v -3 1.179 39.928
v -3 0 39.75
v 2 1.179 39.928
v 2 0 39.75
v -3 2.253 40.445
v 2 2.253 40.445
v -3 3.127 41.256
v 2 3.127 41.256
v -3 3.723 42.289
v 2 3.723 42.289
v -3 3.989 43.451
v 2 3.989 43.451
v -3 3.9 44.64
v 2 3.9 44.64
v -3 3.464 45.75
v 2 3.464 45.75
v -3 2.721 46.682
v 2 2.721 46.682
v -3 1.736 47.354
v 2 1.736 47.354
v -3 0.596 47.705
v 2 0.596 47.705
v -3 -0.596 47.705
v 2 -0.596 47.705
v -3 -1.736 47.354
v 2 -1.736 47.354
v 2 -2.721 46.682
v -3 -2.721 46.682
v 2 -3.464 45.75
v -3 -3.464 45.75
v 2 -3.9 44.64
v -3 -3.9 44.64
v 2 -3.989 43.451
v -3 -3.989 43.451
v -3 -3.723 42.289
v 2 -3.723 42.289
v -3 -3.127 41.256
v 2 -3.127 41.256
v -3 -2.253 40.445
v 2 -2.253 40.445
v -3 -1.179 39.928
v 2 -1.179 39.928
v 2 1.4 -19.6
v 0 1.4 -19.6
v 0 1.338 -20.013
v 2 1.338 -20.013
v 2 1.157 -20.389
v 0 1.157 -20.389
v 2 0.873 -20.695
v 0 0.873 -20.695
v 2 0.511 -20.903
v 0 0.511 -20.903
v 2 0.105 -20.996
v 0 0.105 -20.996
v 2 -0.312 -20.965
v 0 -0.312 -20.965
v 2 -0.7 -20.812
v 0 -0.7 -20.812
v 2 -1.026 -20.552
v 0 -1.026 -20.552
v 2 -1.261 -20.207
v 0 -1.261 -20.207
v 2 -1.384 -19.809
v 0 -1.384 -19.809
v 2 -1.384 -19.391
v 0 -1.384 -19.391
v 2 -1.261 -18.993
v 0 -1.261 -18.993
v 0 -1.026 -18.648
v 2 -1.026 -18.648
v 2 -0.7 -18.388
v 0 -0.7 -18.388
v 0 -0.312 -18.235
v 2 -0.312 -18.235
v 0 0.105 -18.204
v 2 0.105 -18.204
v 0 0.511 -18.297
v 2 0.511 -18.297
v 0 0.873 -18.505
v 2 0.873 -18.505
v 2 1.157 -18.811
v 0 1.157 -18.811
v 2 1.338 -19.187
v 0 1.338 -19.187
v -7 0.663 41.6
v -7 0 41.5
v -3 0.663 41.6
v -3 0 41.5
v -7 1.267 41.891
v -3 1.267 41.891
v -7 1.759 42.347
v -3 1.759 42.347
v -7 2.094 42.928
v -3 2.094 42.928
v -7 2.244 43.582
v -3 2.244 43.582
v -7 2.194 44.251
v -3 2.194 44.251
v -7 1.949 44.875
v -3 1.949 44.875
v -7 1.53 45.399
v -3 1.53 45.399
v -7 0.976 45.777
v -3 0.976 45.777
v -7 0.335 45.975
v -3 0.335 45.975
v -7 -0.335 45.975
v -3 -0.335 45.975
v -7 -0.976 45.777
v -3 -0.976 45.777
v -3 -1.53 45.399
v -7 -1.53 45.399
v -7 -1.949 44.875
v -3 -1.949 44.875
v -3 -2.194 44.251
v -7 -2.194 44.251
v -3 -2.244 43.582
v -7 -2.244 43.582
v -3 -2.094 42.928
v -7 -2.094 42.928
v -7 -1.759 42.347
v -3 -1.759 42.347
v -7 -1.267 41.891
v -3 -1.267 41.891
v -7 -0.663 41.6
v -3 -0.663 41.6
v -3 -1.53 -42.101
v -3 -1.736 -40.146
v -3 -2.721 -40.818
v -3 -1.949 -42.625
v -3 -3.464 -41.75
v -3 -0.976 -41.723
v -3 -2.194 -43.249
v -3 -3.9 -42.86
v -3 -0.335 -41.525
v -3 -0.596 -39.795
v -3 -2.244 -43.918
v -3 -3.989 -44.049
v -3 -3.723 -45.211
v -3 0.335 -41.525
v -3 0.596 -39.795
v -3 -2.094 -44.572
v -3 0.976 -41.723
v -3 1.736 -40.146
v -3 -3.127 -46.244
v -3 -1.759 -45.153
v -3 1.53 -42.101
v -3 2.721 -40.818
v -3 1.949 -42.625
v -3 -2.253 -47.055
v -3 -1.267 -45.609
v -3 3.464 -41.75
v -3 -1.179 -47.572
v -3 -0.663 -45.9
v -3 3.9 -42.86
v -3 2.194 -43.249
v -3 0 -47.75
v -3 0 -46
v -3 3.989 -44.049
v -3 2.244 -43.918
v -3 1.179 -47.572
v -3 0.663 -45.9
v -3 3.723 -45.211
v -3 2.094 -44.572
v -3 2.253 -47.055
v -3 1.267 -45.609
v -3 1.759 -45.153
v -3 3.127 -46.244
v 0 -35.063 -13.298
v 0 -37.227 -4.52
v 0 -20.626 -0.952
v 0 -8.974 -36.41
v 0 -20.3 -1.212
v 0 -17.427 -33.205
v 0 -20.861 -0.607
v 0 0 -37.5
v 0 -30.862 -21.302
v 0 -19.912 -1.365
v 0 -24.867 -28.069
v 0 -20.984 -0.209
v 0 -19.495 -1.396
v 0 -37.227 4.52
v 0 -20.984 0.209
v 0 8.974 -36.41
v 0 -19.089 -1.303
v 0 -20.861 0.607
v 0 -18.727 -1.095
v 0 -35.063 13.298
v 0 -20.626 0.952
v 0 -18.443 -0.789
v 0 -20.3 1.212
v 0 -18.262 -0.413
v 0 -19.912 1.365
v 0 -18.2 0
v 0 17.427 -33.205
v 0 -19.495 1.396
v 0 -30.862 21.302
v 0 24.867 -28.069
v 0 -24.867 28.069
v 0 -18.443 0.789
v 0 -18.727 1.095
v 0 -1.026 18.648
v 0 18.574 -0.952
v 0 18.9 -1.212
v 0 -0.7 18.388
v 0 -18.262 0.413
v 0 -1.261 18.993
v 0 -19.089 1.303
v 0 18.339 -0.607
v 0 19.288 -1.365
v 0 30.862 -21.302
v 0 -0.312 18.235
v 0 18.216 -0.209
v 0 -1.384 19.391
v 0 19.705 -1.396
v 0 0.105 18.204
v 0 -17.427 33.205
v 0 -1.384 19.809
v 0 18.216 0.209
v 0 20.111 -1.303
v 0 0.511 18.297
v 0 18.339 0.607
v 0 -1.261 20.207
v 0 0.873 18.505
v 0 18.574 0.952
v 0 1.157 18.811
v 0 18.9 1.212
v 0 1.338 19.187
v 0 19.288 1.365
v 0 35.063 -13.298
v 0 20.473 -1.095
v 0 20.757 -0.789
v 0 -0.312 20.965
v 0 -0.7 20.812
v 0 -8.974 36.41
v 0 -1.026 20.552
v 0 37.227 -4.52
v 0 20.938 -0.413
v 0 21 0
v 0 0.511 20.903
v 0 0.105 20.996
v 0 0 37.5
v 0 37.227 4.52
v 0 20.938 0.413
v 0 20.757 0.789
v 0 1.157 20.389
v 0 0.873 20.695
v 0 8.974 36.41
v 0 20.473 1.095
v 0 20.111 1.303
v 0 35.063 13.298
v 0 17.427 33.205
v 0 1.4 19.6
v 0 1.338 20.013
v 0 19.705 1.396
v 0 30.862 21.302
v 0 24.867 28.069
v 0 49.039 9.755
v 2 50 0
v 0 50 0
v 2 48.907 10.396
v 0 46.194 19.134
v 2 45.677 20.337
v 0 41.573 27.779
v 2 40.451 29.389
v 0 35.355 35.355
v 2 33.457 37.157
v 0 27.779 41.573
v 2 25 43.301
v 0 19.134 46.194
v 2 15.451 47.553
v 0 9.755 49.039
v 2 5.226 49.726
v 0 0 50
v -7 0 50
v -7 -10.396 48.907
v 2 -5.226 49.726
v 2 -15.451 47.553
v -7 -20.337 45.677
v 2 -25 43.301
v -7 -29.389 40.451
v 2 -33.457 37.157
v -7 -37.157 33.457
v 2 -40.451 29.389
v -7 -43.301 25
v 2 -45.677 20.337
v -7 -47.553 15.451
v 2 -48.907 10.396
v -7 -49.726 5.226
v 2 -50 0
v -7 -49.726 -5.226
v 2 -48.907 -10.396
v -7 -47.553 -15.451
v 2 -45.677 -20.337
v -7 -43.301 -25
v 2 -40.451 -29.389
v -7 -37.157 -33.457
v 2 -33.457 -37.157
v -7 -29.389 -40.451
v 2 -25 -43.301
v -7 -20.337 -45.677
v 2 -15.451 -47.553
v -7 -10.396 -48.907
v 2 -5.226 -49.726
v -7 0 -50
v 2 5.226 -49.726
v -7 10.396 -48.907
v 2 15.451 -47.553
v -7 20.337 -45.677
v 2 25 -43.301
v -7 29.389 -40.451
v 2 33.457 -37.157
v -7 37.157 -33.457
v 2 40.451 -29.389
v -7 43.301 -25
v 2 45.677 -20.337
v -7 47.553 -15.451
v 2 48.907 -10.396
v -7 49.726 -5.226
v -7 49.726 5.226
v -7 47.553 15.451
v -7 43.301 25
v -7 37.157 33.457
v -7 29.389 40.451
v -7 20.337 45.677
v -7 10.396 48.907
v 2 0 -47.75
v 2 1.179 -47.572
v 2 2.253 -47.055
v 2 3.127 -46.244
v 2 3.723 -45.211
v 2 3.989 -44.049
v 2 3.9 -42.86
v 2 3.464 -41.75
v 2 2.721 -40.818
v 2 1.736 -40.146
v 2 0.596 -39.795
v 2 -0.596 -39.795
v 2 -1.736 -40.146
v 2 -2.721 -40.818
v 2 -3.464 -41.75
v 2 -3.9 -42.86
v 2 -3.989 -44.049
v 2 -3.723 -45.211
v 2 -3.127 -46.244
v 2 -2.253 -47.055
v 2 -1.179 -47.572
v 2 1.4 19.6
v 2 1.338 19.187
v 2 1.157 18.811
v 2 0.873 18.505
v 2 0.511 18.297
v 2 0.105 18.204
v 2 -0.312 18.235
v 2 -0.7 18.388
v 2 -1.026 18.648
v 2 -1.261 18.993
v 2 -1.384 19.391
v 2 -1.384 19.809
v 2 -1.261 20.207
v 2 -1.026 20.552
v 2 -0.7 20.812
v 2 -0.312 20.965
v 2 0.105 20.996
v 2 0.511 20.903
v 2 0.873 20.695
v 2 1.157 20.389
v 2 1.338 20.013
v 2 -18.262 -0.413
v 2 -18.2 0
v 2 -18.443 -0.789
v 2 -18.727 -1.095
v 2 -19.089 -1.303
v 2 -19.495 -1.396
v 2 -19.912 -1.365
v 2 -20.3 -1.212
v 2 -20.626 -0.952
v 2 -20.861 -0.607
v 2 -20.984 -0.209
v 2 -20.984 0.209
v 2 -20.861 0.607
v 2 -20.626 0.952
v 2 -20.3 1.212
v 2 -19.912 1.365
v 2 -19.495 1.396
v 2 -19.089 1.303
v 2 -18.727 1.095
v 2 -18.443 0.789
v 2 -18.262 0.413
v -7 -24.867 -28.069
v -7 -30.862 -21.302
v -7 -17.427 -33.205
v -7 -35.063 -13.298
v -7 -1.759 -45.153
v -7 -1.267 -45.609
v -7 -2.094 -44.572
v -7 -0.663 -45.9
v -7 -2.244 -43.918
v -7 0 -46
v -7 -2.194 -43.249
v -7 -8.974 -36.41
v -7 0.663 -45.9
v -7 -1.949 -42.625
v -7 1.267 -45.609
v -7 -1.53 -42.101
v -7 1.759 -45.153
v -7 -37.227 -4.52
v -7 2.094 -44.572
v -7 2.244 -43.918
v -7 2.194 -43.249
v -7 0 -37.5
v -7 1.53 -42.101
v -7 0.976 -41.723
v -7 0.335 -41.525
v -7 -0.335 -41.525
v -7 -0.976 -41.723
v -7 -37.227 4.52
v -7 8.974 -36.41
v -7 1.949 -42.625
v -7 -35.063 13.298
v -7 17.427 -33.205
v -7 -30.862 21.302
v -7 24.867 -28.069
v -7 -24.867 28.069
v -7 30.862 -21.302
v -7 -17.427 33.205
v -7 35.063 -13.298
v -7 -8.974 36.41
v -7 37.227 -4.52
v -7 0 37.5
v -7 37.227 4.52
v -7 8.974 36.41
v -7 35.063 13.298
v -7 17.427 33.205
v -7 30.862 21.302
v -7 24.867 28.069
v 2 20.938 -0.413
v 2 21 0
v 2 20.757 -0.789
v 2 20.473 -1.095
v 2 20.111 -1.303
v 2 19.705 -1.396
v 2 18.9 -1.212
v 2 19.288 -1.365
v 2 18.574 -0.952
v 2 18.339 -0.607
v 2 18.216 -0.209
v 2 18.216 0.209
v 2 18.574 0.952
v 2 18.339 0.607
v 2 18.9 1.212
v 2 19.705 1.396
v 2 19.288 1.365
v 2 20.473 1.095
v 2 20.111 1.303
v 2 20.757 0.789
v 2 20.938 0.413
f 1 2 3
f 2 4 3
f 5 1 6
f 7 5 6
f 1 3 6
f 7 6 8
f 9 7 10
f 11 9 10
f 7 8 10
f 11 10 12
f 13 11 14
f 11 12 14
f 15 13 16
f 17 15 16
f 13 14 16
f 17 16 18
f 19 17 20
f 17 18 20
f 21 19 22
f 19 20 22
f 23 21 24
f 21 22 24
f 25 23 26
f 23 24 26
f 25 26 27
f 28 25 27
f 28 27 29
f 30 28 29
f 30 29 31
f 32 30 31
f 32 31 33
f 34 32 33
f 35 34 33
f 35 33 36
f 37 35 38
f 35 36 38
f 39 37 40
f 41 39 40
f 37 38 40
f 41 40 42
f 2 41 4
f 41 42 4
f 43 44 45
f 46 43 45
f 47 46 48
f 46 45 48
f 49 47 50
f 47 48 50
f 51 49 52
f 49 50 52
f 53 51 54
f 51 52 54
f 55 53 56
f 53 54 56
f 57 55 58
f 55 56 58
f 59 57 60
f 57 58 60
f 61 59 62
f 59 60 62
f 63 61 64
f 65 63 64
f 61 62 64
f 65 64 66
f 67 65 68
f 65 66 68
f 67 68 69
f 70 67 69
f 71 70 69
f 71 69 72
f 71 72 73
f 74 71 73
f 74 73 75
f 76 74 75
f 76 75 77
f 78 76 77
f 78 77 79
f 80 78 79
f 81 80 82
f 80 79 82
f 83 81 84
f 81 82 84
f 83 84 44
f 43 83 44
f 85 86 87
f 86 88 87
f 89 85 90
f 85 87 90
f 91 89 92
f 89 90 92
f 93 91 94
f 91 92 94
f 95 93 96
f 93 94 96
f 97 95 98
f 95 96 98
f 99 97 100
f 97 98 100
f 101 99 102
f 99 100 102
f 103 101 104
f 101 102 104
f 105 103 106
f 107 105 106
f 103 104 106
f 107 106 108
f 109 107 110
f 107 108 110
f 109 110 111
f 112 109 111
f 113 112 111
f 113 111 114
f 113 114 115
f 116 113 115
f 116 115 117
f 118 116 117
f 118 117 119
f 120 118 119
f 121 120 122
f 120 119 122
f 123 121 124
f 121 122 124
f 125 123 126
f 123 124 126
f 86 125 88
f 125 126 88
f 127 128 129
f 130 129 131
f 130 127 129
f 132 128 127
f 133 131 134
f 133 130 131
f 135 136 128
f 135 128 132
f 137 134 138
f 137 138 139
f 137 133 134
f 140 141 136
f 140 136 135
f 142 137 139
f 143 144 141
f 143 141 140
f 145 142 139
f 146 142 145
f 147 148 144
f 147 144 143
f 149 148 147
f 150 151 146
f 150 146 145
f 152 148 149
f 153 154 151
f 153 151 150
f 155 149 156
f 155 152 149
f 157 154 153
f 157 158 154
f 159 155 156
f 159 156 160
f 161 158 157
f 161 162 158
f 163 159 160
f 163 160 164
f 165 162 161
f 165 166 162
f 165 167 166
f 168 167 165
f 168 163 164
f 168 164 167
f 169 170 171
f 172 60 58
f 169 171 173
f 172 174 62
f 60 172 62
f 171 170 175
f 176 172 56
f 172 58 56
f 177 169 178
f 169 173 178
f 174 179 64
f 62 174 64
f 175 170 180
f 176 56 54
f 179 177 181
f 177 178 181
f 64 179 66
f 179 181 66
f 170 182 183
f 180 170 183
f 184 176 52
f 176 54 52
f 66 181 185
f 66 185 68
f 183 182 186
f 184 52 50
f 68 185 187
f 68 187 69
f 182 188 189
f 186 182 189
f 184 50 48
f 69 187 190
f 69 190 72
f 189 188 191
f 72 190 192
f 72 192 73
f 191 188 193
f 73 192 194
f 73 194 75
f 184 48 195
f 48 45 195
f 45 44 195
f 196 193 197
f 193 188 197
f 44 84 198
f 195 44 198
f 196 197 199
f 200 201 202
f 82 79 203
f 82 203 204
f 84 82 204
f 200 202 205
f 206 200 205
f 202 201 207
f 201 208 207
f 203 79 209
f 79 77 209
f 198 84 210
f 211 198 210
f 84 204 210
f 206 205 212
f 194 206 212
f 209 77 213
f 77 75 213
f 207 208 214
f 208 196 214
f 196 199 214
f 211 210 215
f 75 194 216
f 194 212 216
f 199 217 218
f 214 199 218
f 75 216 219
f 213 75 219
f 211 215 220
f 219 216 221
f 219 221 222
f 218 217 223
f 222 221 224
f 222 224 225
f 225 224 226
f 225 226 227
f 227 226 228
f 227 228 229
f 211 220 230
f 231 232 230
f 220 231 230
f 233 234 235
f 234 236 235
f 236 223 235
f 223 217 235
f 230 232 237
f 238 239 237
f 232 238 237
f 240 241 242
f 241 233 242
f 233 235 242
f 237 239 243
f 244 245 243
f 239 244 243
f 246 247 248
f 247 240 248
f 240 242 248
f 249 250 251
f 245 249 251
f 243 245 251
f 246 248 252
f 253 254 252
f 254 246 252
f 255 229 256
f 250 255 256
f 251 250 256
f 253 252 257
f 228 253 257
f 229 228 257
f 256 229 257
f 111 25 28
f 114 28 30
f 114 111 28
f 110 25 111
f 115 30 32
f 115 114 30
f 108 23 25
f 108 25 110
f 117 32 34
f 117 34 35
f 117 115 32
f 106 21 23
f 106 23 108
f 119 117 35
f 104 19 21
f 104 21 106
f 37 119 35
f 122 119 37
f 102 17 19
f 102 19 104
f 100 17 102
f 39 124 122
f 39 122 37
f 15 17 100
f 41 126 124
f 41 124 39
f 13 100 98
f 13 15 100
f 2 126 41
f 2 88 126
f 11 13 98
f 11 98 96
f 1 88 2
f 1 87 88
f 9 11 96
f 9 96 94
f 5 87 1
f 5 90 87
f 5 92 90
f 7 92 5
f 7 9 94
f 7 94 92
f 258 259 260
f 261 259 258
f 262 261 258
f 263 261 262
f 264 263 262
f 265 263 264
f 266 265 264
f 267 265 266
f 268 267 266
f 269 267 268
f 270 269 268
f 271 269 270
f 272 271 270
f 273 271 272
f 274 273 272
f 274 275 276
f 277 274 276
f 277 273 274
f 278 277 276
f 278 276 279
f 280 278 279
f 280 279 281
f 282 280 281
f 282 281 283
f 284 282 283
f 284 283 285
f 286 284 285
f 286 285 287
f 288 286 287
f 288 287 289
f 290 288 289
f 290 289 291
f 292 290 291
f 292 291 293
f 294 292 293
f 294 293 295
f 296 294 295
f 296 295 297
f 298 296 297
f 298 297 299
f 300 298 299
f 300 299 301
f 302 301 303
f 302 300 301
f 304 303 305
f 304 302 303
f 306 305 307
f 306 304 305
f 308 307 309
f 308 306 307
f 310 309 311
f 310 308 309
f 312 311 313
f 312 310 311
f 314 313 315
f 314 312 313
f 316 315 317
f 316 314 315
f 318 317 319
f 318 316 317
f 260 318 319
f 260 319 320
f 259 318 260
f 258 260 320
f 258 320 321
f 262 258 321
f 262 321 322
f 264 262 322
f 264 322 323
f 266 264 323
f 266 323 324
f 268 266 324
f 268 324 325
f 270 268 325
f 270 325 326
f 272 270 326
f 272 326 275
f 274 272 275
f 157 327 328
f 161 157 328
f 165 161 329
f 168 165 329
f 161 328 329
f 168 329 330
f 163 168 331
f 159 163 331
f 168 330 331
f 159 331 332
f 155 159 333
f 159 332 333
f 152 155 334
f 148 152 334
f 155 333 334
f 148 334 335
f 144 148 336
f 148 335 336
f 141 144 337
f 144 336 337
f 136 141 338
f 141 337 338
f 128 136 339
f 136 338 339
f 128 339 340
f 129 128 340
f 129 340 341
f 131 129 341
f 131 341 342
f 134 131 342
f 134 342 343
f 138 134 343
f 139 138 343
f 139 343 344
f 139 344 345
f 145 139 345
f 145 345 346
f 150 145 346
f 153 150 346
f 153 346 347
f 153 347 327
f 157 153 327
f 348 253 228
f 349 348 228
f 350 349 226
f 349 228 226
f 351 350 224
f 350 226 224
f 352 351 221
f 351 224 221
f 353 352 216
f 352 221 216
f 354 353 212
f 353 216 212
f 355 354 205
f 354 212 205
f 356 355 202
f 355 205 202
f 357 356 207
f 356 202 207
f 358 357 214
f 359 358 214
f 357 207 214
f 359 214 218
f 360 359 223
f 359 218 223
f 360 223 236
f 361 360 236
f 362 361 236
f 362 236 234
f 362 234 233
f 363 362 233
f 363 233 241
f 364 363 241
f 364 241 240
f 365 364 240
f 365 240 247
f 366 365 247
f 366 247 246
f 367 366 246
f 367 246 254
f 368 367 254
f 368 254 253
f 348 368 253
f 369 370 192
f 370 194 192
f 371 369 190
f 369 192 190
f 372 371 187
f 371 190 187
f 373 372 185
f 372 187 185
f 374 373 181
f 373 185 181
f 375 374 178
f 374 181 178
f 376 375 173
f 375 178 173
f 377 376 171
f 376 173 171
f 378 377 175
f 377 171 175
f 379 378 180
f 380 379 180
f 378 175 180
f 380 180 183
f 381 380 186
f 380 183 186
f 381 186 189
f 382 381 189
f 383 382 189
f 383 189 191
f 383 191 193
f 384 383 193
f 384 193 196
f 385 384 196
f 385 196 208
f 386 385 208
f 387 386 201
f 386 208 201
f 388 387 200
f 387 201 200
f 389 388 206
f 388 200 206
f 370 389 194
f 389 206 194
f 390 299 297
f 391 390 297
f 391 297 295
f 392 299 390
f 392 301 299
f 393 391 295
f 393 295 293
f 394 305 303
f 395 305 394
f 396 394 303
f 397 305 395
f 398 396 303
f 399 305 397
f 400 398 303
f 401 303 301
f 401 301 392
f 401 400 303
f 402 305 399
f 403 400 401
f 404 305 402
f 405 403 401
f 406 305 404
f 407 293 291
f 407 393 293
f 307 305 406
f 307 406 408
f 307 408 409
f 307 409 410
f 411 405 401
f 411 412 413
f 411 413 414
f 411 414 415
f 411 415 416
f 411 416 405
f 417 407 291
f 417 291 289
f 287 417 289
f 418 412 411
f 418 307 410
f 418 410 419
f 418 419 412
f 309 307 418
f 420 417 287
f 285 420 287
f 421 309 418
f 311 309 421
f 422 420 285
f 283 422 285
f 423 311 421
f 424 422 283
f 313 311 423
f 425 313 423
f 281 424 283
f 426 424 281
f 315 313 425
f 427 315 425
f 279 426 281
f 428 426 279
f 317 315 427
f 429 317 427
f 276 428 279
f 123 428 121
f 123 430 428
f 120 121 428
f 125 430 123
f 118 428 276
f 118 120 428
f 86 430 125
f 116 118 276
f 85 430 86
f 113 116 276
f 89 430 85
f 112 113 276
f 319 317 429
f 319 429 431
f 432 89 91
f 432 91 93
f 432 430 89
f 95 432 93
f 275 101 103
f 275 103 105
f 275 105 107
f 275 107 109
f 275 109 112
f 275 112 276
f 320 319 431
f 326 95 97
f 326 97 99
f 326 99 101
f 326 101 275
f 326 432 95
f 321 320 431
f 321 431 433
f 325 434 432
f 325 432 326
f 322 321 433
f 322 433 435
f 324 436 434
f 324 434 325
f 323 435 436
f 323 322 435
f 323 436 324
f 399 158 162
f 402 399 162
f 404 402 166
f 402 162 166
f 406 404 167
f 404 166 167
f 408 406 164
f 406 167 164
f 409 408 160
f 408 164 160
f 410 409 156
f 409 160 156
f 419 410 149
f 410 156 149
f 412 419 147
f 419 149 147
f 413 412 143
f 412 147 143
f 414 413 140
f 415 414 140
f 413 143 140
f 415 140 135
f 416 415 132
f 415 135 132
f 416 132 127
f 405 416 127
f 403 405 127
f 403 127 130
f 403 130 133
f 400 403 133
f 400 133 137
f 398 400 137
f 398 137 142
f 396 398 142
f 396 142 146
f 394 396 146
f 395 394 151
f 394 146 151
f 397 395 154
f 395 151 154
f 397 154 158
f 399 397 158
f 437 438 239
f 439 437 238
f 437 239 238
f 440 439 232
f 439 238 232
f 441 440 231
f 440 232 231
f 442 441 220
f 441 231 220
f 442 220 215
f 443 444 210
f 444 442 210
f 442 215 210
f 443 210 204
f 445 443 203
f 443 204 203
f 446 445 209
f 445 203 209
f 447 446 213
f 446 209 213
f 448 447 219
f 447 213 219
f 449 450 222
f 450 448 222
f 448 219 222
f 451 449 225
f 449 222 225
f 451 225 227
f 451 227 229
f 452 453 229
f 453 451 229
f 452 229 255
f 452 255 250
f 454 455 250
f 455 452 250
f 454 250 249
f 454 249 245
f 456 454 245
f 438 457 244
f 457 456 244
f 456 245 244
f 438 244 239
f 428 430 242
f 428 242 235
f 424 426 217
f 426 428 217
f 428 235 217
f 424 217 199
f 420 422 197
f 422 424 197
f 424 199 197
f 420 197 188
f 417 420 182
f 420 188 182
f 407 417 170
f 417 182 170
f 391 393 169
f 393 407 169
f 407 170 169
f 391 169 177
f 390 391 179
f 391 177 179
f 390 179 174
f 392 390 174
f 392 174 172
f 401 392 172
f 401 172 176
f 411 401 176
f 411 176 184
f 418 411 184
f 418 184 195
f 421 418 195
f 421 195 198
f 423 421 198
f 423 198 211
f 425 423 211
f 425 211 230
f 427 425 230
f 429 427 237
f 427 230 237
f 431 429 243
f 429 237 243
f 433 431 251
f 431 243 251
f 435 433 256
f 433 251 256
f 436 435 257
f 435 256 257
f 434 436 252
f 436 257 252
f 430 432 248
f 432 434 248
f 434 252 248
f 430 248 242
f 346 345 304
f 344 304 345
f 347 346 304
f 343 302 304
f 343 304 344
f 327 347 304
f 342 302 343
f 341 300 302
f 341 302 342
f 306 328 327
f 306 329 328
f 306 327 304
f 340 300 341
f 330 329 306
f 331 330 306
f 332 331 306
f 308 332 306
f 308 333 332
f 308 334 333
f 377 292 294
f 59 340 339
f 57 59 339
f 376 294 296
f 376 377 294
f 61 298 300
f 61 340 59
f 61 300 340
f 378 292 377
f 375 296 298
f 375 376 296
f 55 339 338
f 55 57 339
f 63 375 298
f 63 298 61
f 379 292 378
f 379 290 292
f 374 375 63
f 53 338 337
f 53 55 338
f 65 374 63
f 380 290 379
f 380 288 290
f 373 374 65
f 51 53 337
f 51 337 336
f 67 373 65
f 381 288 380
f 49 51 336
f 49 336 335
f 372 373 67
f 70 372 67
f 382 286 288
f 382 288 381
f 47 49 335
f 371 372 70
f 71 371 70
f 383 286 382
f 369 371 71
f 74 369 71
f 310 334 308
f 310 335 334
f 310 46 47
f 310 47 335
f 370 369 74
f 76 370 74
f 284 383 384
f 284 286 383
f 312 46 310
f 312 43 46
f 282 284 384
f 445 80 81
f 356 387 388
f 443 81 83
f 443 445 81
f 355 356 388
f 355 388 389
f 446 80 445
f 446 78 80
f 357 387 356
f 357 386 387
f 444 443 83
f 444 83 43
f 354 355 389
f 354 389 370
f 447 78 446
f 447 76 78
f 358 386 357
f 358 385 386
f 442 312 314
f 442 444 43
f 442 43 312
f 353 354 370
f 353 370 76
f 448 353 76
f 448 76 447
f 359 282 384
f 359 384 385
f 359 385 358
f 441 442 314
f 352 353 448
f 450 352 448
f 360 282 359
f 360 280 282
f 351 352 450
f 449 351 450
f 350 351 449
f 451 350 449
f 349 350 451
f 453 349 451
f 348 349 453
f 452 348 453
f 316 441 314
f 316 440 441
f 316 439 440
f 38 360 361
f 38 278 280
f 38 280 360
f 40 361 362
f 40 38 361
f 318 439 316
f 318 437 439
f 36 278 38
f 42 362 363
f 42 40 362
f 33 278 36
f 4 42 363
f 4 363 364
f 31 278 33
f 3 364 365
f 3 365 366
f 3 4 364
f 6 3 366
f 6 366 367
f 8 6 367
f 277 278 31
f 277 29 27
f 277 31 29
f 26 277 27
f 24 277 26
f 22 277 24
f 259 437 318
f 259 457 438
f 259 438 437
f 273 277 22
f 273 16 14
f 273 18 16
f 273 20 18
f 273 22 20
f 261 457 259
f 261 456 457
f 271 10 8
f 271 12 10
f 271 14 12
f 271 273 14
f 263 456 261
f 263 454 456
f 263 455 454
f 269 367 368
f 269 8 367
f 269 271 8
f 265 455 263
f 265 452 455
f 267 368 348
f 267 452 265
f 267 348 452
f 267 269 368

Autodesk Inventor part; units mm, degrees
ref_plane "YZ Plane" through (0, 0, 0) normal (1, 0, 0) x (0, 1, 0)
ref_plane "XZ Plane" through (0, 0, 0) normal (0, 1, 0) x (-1, 0, 0)
ref_plane "XY Plane" through (0, 0, 0) normal (0, 0, 1) x (1, 0, 0)
sketch "スケッチ1" plane through (0, 0, 0) normal (1, 0, 0) x (0, 1, 0)
  circle A0 centre (0, 0) radius 19.6
  circle A1 centre (0, 19.6) radius 1.4
  circle A2 centre (-19.6, 0) radius 1.4
  circle A3 centre (0, -19.6) radius 1.4
  circle A4 centre (19.6, 0) radius 1.4
  circle A5 centre (0, 0) radius 50
  dimension "d0" = 39.2
  dimension "d1" = 2.8
  dimension "d4" = 360
  dimension "d6" = 100
extrude "押し出し1" add sketch "スケッチ1" along normal blind 2 contours A4 A0 A3 A2 A1 | A5
sketch "スケッチ2" plane through (0, 0, 0) normal (-1, 0, 0) x (0, 0, 1)
  circle A0 centre (0, 0) radius 50
  circle A1 centre (0, 0) radius 37.5
  dimension "d9" = 75
extrude "押し出し2" add sketch "スケッチ2" along normal blind 7
sketch "スケッチ3" plane through (2, 0, 0) normal (1, 0, 0) x (0, 0, -1)
  circle A0 centre (0, 0) radius 43.75
  circle A1 centre (-43.75, 0) radius 2.25
  circle A2 centre (43.75, 0) radius 2.25
  dimension "d12" = 87.5
  dimension "d13" = 4.5
  dimension "d14" = 4.5
extrude "押し出し3" cut sketch "スケッチ3" against normal blind 10 contours A0 A2 | A0 A2 | A1 A0 | A0 A1
sketch "スケッチ4" plane through (2, 0, 0) normal (1, 0, 0) x (0, 0, -1)
  circle A0 centre (-43.75, 0) radius 2.25 projected
  circle A1 centre (-43.75, 0) radius 4
  circle A2 centre (43.75, 0) radius 2.25 projected
  circle A3 centre (43.75, 0) radius 4
  point P0 (0, 0)
  dimension "d17" = 8
  dimension "d18" = 8
extrude "押し出し4" cut sketch "スケッチ4" against normal blind 5
properties part number "laboratory_equipment-GIM3505-8" material "ABS プラスチック"
